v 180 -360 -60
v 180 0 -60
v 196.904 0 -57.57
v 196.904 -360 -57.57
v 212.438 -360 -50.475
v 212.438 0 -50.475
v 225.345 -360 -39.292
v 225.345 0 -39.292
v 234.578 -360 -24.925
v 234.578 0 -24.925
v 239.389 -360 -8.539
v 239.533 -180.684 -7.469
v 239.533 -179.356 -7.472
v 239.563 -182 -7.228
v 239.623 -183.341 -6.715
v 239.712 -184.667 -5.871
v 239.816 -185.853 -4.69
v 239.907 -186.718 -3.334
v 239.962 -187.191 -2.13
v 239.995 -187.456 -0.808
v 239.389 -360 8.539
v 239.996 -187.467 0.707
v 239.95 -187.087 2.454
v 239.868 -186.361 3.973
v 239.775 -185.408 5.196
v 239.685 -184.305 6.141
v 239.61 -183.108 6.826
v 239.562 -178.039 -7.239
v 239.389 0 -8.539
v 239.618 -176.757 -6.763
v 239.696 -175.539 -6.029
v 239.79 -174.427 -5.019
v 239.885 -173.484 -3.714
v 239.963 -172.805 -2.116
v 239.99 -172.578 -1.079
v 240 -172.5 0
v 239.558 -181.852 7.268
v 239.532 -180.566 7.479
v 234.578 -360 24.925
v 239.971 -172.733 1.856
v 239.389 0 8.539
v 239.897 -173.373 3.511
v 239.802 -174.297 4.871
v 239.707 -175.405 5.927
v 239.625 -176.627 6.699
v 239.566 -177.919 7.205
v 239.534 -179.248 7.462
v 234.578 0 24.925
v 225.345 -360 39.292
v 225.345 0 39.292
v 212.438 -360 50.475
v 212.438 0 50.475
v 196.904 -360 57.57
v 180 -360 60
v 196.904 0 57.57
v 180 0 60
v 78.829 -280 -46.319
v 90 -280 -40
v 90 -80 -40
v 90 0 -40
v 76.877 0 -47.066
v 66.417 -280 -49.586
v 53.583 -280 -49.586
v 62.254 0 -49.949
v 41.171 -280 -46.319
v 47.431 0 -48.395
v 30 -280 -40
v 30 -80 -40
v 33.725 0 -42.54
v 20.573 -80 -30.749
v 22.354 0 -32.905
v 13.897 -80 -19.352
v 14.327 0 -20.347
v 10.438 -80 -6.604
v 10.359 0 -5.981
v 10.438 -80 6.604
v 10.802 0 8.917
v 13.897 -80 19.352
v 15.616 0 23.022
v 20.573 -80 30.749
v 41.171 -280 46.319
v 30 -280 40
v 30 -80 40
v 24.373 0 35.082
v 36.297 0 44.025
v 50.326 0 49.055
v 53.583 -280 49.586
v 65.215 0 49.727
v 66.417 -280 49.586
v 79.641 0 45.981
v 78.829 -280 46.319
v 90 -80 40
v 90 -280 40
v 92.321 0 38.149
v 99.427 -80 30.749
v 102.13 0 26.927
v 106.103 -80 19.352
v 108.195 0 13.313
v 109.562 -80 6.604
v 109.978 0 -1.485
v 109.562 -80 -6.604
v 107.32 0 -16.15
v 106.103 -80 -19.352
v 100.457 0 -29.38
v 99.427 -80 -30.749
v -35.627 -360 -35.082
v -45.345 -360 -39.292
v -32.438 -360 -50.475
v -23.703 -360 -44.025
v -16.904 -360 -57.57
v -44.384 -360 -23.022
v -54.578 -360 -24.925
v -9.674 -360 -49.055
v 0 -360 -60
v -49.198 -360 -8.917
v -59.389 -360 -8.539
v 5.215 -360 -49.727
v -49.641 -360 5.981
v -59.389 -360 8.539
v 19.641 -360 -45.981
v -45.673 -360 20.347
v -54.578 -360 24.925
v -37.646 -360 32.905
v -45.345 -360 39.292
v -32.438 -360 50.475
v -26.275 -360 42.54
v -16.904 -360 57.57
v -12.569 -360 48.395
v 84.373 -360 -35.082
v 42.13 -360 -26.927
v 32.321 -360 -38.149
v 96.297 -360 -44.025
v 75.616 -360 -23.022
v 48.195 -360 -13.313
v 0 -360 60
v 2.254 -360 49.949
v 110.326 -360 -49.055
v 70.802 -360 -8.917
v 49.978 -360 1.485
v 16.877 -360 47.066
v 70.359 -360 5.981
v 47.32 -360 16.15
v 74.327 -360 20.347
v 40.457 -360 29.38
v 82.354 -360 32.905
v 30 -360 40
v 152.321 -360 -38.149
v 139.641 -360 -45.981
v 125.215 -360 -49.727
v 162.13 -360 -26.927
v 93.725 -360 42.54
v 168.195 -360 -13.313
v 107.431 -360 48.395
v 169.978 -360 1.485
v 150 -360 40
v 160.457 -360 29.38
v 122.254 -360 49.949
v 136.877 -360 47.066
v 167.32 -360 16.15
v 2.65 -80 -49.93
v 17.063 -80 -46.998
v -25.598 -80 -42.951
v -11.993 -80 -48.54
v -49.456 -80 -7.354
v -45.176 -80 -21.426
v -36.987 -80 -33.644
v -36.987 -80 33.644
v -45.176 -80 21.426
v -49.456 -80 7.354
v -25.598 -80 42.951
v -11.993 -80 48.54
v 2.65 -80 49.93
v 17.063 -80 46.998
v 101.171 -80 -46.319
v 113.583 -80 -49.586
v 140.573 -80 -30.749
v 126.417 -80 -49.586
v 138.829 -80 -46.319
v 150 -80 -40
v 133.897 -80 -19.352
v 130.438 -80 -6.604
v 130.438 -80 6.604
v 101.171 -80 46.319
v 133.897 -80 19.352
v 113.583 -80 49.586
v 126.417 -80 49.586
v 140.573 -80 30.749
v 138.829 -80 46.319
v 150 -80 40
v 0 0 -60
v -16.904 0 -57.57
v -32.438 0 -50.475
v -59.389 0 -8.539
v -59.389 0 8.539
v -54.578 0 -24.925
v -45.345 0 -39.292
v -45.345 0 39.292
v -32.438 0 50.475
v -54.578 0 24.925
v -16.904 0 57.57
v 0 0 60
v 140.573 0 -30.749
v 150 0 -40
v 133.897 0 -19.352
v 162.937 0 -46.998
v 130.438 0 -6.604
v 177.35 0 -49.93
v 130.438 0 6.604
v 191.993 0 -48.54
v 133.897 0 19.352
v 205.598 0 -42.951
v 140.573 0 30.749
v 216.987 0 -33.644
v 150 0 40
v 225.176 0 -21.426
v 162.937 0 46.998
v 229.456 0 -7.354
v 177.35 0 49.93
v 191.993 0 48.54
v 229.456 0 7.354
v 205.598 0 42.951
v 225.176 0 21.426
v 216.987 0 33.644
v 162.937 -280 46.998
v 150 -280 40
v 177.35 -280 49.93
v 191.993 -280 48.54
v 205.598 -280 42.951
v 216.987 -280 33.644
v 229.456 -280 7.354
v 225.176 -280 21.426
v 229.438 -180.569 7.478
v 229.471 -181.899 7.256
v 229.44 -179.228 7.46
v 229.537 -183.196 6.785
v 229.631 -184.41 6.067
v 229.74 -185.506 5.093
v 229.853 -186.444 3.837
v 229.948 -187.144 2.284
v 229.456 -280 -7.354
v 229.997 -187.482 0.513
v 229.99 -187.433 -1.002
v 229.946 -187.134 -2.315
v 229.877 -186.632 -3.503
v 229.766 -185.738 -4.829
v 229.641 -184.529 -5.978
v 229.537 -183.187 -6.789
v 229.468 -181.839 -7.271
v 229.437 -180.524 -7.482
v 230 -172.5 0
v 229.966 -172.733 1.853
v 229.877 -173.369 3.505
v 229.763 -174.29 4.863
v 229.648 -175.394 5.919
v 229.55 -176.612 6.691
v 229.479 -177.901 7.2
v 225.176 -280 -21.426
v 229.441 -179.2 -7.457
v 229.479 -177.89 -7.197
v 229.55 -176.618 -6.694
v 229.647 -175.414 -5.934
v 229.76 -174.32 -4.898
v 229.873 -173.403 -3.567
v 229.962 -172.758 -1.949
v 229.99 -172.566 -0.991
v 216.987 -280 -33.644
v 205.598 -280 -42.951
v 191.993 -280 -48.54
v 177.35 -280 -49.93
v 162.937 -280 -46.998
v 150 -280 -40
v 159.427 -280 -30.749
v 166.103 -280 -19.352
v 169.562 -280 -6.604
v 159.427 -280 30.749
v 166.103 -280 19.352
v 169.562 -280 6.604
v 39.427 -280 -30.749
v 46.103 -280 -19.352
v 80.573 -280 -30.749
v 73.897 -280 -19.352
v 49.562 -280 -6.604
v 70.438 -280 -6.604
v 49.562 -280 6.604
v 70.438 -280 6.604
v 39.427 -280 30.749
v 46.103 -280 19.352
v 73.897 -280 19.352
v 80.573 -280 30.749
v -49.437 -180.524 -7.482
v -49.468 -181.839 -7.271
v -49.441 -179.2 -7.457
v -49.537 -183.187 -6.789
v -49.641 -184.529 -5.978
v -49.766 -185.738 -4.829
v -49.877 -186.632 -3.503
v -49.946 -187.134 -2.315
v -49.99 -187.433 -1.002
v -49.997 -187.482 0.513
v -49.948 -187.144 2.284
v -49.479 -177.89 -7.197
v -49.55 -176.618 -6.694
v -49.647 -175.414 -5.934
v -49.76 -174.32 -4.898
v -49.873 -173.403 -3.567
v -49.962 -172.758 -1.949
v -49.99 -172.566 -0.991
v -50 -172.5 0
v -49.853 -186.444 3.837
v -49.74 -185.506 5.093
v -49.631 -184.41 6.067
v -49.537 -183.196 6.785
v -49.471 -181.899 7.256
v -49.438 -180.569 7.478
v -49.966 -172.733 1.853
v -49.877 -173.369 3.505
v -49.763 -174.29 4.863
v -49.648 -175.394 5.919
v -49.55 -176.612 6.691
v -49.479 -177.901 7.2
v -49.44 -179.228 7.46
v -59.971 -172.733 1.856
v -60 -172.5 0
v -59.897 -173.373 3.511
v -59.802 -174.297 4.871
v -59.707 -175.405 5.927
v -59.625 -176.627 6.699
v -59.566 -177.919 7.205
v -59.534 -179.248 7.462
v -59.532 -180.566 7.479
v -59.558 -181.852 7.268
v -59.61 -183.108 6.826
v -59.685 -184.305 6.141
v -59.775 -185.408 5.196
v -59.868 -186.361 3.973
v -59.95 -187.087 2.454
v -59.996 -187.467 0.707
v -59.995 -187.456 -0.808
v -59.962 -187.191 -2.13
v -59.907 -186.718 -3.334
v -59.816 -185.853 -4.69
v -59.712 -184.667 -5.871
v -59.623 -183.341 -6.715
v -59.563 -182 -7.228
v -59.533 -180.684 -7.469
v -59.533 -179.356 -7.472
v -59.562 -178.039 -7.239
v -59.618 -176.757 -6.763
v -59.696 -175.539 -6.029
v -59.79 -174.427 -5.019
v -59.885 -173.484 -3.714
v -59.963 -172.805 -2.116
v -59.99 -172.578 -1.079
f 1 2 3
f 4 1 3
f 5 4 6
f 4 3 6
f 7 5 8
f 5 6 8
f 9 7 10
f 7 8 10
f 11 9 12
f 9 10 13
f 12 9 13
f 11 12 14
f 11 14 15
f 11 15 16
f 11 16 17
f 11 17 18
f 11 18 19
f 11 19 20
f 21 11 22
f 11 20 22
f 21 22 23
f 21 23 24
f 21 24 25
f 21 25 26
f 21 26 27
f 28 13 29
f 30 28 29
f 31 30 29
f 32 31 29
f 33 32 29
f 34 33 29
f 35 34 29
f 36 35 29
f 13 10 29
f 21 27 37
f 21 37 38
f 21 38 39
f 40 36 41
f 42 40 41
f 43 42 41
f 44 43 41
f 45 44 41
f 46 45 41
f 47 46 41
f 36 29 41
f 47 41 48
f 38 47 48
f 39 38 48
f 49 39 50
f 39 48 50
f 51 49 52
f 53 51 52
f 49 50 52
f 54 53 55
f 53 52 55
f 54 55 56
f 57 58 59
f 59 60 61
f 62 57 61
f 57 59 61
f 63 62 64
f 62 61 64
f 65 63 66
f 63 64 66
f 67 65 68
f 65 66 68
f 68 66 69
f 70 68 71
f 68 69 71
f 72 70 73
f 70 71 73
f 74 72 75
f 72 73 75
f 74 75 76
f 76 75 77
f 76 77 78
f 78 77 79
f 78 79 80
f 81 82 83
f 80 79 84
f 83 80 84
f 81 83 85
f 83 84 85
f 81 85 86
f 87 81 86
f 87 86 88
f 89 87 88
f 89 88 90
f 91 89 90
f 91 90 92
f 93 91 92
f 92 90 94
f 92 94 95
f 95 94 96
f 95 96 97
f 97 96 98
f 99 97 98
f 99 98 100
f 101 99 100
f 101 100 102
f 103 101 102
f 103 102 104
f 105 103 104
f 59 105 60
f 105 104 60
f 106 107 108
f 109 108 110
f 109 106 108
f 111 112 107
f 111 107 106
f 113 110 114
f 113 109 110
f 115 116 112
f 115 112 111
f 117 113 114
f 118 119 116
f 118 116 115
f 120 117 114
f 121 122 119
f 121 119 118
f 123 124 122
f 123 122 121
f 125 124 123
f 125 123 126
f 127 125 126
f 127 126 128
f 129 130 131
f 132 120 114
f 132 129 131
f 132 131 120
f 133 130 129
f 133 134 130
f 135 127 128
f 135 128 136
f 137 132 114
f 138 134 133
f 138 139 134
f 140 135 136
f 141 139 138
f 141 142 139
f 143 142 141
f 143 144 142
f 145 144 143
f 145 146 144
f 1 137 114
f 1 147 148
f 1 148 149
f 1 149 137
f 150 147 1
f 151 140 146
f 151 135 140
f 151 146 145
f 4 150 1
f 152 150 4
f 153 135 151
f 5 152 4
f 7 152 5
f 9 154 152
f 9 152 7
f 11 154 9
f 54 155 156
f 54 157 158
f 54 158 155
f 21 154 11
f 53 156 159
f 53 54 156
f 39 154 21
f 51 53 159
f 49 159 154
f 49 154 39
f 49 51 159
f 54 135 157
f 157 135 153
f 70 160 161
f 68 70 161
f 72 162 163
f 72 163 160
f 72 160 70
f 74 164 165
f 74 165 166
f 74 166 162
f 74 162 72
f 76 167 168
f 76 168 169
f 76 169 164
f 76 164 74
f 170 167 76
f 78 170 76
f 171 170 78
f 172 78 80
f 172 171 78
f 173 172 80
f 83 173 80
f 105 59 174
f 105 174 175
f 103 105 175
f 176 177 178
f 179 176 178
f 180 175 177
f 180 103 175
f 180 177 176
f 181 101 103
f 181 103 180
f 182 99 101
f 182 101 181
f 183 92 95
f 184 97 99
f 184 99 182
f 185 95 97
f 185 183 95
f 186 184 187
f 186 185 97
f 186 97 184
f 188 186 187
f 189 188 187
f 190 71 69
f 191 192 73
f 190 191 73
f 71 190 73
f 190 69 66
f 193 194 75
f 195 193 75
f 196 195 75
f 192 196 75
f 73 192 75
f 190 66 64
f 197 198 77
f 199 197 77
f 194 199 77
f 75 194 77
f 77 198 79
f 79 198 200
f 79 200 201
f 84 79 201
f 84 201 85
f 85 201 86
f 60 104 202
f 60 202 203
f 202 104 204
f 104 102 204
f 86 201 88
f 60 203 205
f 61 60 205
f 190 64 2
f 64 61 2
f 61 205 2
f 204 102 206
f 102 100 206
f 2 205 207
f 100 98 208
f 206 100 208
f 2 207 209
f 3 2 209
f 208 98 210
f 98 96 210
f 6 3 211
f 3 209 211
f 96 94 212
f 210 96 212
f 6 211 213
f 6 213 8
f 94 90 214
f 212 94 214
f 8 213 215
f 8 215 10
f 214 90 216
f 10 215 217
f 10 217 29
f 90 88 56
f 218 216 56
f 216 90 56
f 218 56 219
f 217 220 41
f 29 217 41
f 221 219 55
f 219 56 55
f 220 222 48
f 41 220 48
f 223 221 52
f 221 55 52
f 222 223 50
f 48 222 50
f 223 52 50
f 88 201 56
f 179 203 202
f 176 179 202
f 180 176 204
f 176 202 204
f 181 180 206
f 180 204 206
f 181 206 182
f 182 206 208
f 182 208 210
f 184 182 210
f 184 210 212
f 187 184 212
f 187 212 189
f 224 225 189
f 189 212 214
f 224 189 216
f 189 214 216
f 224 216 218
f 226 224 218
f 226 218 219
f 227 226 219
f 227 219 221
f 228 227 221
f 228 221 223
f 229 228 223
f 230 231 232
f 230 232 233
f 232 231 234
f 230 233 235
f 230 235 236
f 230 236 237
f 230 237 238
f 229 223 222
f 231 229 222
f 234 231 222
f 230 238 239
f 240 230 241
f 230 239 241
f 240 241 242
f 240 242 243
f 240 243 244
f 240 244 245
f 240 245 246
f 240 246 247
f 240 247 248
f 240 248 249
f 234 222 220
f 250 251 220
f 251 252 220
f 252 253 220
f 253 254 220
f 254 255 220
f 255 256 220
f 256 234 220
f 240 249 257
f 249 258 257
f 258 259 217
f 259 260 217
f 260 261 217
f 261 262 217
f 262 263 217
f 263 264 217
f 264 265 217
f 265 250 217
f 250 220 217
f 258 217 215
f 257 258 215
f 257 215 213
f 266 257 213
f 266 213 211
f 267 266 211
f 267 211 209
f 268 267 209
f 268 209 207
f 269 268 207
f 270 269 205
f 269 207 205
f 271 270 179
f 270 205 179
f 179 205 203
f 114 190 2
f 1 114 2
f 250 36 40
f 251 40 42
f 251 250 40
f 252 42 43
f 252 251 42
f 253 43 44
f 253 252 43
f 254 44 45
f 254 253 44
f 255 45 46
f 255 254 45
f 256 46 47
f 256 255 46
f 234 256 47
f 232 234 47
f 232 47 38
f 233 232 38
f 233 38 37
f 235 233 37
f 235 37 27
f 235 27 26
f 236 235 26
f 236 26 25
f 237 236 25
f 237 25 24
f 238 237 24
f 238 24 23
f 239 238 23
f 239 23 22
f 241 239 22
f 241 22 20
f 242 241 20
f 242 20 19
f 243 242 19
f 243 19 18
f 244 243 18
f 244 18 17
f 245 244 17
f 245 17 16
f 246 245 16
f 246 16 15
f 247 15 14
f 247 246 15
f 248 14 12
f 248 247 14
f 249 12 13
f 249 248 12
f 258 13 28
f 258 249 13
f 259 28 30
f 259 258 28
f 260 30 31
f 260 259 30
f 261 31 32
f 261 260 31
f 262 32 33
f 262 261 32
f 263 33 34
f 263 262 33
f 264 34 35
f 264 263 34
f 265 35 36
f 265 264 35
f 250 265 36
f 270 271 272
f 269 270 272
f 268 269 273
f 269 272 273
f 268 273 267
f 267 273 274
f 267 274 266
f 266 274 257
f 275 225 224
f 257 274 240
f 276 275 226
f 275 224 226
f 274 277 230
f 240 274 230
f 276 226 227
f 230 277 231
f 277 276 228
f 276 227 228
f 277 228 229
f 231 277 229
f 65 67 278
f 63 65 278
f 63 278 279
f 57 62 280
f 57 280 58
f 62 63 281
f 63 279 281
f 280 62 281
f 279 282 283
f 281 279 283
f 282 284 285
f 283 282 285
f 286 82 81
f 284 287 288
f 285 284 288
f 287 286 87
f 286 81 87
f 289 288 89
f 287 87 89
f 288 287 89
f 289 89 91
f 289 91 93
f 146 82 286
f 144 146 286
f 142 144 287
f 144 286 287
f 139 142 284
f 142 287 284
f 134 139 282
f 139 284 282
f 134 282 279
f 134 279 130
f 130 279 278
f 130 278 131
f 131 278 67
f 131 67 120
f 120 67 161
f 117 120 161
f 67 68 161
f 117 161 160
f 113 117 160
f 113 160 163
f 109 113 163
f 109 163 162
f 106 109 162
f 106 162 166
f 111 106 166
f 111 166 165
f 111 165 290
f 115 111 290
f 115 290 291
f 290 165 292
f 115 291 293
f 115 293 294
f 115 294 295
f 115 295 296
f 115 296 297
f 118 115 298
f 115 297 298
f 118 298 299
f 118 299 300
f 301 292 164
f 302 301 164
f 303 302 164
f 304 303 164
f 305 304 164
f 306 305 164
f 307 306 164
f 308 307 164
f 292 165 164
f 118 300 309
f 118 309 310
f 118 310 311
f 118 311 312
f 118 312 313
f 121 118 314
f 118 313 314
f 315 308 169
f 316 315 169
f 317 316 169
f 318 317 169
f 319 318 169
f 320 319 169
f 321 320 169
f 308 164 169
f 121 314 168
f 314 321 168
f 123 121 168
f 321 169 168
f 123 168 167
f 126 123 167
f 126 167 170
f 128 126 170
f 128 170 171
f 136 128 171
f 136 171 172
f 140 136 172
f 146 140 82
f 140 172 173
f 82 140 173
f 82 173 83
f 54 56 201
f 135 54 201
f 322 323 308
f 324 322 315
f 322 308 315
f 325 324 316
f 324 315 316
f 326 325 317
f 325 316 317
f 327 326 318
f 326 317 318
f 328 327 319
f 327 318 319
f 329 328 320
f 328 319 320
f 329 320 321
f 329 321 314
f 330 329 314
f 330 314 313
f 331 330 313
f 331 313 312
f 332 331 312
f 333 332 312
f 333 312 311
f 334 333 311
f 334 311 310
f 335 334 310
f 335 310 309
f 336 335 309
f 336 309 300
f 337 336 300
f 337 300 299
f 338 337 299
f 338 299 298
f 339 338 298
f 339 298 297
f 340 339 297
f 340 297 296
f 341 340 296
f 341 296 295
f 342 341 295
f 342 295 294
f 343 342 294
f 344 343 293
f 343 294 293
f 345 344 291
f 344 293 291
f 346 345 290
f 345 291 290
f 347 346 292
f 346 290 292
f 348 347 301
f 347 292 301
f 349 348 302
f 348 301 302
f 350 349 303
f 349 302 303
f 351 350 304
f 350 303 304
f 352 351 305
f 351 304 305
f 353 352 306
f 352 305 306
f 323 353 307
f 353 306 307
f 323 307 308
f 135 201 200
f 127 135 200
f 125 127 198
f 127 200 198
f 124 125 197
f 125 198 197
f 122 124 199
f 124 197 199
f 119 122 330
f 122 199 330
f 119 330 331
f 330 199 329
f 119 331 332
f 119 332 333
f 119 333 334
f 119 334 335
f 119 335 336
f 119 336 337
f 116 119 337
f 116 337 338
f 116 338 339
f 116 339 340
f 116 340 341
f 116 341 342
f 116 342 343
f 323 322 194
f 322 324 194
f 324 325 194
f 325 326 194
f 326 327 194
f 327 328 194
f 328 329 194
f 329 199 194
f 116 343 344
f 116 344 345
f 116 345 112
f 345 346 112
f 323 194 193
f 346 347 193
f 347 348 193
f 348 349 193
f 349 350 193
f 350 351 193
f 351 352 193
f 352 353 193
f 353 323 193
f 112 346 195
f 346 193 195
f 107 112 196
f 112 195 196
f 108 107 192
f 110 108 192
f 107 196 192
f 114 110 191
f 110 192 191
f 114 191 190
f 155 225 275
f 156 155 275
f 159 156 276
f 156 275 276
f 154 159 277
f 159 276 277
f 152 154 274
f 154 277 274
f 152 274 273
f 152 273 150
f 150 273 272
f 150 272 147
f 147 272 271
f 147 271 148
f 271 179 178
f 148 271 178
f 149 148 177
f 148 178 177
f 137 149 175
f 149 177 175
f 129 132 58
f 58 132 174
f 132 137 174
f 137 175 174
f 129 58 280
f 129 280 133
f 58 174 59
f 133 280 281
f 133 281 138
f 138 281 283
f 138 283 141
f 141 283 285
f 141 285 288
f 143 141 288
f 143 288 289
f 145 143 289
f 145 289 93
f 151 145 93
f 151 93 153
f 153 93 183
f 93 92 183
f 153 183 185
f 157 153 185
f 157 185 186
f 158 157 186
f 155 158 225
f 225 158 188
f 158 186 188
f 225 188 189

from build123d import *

# Parameters (mm, degrees)
F1_DEPTH      = 360
F2_R          = 7.5
F3_DEPTH      = 60.001
F3_DEPTH_BACK = 240.001
F4_START      = 280
F4_DEPTH      = 80
F5_DEPTH      = 80


with BuildPart() as f1:
    # F0 (on Front) → F1 (new body)
    with BuildSketch(Plane.XZ):
        with BuildLine():
            Line((180, 60), (0, 60))
            ThreePointArc((0, 60), (-60, 0), (0, -60))
            Line((0, -60), (180, -60))
            ThreePointArc((180, -60), (240, 0), (180, 60))
        make_face()
        with BuildLine():
            ThreePointArc((30, -40), (-50, 0), (30, 40))
            ThreePointArc((30, 40), (60, 50), (90, 40))
            ThreePointArc((90, 40), (120, 50), (150, 40))
            ThreePointArc((150, 40), (202.360679775, 44.72135955), (230, 0))
            ThreePointArc((230, 0), (202.360679775, -44.72135955), (150, -40))
            ThreePointArc((150, -40), (120, -50), (90, -40))
            ThreePointArc((90, -40), (60, -50), (30, -40))
        make_face(mode=Mode.SUBTRACT)
    extrude(amount=F1_DEPTH)

    # F2 (on Right) → F3 (cut, two sides)
    with BuildSketch(Plane.YZ) as f3_sk:
        with Locations((-180, 0)):
            Circle(F2_R)
    extrude(amount=-F3_DEPTH, mode=Mode.SUBTRACT)
    extrude(f3_sk.sketch, amount=F3_DEPTH_BACK, mode=Mode.SUBTRACT)

    # F0 (on Front) → F4 (join)
    with BuildSketch(Plane.XZ.offset(F4_START)):
        with BuildLine():
            ThreePointArc((30, 40), (44.72135955, 22.360679775), (50, 0))
            Line((50, 0), (60, 0))
            Line((60, 0), (70, 0))
            ThreePointArc((70, 0), (75.27864045, 22.360679775), (90, 40))
            ThreePointArc((90, 40), (60, 50), (30, 40))
        make_face()
        with BuildLine():
            Line((60, 0), (50, 0))
            ThreePointArc((50, 0), (44.72135955, -22.360679775), (30, -40))
            ThreePointArc((30, -40), (60, -50), (90, -40))
            ThreePointArc((90, -40), (75.27864045, -22.360679775), (70, 0))
            Line((70, 0), (60, 0))
        make_face()
        with BuildLine():
            ThreePointArc((230, 0), (202.360679775, 44.72135955), (150, 40))
            ThreePointArc((150, 40), (164.72135955, 22.360679775), (170, 0))
            ThreePointArc((170, 0), (164.72135955, -22.360679775), (150, -40))
            ThreePointArc((150, -40), (202.360679775, -44.72135955), (230, 0))
        make_face()
    extrude(amount=F4_DEPTH)

    # F0 (on Front) → F5 (join)
    with BuildSketch(Plane.XZ):
        with BuildLine():
            ThreePointArc((10, 0), (15.27864045, 22.360679775), (30, 40))
            ThreePointArc((30, 40), (-50, 0), (30, -40))
            ThreePointArc((30, -40), (15.27864045, -22.360679775), (10, 0))
        make_face()
        with BuildLine():
            ThreePointArc((150, 40), (120, 50), (90, 40))
            ThreePointArc((90, 40), (104.72135955, 22.360679775), (110, 0))
            Line((110, 0), (120, 0))
            Line((120, 0), (130, 0))
            ThreePointArc((130, 0), (135.27864045, 22.360679775), (150, 40))
        make_face()
        with BuildLine():
            ThreePointArc((110, 0), (104.72135955, -22.360679775), (90, -40))
            ThreePointArc((90, -40), (120, -50), (150, -40))
            ThreePointArc((150, -40), (135.27864045, -22.360679775), (130, 0))
            Line((130, 0), (120, 0))
            Line((120, 0), (110, 0))
        make_face()
    extrude(amount=F5_DEPTH)


solid = f1.part
